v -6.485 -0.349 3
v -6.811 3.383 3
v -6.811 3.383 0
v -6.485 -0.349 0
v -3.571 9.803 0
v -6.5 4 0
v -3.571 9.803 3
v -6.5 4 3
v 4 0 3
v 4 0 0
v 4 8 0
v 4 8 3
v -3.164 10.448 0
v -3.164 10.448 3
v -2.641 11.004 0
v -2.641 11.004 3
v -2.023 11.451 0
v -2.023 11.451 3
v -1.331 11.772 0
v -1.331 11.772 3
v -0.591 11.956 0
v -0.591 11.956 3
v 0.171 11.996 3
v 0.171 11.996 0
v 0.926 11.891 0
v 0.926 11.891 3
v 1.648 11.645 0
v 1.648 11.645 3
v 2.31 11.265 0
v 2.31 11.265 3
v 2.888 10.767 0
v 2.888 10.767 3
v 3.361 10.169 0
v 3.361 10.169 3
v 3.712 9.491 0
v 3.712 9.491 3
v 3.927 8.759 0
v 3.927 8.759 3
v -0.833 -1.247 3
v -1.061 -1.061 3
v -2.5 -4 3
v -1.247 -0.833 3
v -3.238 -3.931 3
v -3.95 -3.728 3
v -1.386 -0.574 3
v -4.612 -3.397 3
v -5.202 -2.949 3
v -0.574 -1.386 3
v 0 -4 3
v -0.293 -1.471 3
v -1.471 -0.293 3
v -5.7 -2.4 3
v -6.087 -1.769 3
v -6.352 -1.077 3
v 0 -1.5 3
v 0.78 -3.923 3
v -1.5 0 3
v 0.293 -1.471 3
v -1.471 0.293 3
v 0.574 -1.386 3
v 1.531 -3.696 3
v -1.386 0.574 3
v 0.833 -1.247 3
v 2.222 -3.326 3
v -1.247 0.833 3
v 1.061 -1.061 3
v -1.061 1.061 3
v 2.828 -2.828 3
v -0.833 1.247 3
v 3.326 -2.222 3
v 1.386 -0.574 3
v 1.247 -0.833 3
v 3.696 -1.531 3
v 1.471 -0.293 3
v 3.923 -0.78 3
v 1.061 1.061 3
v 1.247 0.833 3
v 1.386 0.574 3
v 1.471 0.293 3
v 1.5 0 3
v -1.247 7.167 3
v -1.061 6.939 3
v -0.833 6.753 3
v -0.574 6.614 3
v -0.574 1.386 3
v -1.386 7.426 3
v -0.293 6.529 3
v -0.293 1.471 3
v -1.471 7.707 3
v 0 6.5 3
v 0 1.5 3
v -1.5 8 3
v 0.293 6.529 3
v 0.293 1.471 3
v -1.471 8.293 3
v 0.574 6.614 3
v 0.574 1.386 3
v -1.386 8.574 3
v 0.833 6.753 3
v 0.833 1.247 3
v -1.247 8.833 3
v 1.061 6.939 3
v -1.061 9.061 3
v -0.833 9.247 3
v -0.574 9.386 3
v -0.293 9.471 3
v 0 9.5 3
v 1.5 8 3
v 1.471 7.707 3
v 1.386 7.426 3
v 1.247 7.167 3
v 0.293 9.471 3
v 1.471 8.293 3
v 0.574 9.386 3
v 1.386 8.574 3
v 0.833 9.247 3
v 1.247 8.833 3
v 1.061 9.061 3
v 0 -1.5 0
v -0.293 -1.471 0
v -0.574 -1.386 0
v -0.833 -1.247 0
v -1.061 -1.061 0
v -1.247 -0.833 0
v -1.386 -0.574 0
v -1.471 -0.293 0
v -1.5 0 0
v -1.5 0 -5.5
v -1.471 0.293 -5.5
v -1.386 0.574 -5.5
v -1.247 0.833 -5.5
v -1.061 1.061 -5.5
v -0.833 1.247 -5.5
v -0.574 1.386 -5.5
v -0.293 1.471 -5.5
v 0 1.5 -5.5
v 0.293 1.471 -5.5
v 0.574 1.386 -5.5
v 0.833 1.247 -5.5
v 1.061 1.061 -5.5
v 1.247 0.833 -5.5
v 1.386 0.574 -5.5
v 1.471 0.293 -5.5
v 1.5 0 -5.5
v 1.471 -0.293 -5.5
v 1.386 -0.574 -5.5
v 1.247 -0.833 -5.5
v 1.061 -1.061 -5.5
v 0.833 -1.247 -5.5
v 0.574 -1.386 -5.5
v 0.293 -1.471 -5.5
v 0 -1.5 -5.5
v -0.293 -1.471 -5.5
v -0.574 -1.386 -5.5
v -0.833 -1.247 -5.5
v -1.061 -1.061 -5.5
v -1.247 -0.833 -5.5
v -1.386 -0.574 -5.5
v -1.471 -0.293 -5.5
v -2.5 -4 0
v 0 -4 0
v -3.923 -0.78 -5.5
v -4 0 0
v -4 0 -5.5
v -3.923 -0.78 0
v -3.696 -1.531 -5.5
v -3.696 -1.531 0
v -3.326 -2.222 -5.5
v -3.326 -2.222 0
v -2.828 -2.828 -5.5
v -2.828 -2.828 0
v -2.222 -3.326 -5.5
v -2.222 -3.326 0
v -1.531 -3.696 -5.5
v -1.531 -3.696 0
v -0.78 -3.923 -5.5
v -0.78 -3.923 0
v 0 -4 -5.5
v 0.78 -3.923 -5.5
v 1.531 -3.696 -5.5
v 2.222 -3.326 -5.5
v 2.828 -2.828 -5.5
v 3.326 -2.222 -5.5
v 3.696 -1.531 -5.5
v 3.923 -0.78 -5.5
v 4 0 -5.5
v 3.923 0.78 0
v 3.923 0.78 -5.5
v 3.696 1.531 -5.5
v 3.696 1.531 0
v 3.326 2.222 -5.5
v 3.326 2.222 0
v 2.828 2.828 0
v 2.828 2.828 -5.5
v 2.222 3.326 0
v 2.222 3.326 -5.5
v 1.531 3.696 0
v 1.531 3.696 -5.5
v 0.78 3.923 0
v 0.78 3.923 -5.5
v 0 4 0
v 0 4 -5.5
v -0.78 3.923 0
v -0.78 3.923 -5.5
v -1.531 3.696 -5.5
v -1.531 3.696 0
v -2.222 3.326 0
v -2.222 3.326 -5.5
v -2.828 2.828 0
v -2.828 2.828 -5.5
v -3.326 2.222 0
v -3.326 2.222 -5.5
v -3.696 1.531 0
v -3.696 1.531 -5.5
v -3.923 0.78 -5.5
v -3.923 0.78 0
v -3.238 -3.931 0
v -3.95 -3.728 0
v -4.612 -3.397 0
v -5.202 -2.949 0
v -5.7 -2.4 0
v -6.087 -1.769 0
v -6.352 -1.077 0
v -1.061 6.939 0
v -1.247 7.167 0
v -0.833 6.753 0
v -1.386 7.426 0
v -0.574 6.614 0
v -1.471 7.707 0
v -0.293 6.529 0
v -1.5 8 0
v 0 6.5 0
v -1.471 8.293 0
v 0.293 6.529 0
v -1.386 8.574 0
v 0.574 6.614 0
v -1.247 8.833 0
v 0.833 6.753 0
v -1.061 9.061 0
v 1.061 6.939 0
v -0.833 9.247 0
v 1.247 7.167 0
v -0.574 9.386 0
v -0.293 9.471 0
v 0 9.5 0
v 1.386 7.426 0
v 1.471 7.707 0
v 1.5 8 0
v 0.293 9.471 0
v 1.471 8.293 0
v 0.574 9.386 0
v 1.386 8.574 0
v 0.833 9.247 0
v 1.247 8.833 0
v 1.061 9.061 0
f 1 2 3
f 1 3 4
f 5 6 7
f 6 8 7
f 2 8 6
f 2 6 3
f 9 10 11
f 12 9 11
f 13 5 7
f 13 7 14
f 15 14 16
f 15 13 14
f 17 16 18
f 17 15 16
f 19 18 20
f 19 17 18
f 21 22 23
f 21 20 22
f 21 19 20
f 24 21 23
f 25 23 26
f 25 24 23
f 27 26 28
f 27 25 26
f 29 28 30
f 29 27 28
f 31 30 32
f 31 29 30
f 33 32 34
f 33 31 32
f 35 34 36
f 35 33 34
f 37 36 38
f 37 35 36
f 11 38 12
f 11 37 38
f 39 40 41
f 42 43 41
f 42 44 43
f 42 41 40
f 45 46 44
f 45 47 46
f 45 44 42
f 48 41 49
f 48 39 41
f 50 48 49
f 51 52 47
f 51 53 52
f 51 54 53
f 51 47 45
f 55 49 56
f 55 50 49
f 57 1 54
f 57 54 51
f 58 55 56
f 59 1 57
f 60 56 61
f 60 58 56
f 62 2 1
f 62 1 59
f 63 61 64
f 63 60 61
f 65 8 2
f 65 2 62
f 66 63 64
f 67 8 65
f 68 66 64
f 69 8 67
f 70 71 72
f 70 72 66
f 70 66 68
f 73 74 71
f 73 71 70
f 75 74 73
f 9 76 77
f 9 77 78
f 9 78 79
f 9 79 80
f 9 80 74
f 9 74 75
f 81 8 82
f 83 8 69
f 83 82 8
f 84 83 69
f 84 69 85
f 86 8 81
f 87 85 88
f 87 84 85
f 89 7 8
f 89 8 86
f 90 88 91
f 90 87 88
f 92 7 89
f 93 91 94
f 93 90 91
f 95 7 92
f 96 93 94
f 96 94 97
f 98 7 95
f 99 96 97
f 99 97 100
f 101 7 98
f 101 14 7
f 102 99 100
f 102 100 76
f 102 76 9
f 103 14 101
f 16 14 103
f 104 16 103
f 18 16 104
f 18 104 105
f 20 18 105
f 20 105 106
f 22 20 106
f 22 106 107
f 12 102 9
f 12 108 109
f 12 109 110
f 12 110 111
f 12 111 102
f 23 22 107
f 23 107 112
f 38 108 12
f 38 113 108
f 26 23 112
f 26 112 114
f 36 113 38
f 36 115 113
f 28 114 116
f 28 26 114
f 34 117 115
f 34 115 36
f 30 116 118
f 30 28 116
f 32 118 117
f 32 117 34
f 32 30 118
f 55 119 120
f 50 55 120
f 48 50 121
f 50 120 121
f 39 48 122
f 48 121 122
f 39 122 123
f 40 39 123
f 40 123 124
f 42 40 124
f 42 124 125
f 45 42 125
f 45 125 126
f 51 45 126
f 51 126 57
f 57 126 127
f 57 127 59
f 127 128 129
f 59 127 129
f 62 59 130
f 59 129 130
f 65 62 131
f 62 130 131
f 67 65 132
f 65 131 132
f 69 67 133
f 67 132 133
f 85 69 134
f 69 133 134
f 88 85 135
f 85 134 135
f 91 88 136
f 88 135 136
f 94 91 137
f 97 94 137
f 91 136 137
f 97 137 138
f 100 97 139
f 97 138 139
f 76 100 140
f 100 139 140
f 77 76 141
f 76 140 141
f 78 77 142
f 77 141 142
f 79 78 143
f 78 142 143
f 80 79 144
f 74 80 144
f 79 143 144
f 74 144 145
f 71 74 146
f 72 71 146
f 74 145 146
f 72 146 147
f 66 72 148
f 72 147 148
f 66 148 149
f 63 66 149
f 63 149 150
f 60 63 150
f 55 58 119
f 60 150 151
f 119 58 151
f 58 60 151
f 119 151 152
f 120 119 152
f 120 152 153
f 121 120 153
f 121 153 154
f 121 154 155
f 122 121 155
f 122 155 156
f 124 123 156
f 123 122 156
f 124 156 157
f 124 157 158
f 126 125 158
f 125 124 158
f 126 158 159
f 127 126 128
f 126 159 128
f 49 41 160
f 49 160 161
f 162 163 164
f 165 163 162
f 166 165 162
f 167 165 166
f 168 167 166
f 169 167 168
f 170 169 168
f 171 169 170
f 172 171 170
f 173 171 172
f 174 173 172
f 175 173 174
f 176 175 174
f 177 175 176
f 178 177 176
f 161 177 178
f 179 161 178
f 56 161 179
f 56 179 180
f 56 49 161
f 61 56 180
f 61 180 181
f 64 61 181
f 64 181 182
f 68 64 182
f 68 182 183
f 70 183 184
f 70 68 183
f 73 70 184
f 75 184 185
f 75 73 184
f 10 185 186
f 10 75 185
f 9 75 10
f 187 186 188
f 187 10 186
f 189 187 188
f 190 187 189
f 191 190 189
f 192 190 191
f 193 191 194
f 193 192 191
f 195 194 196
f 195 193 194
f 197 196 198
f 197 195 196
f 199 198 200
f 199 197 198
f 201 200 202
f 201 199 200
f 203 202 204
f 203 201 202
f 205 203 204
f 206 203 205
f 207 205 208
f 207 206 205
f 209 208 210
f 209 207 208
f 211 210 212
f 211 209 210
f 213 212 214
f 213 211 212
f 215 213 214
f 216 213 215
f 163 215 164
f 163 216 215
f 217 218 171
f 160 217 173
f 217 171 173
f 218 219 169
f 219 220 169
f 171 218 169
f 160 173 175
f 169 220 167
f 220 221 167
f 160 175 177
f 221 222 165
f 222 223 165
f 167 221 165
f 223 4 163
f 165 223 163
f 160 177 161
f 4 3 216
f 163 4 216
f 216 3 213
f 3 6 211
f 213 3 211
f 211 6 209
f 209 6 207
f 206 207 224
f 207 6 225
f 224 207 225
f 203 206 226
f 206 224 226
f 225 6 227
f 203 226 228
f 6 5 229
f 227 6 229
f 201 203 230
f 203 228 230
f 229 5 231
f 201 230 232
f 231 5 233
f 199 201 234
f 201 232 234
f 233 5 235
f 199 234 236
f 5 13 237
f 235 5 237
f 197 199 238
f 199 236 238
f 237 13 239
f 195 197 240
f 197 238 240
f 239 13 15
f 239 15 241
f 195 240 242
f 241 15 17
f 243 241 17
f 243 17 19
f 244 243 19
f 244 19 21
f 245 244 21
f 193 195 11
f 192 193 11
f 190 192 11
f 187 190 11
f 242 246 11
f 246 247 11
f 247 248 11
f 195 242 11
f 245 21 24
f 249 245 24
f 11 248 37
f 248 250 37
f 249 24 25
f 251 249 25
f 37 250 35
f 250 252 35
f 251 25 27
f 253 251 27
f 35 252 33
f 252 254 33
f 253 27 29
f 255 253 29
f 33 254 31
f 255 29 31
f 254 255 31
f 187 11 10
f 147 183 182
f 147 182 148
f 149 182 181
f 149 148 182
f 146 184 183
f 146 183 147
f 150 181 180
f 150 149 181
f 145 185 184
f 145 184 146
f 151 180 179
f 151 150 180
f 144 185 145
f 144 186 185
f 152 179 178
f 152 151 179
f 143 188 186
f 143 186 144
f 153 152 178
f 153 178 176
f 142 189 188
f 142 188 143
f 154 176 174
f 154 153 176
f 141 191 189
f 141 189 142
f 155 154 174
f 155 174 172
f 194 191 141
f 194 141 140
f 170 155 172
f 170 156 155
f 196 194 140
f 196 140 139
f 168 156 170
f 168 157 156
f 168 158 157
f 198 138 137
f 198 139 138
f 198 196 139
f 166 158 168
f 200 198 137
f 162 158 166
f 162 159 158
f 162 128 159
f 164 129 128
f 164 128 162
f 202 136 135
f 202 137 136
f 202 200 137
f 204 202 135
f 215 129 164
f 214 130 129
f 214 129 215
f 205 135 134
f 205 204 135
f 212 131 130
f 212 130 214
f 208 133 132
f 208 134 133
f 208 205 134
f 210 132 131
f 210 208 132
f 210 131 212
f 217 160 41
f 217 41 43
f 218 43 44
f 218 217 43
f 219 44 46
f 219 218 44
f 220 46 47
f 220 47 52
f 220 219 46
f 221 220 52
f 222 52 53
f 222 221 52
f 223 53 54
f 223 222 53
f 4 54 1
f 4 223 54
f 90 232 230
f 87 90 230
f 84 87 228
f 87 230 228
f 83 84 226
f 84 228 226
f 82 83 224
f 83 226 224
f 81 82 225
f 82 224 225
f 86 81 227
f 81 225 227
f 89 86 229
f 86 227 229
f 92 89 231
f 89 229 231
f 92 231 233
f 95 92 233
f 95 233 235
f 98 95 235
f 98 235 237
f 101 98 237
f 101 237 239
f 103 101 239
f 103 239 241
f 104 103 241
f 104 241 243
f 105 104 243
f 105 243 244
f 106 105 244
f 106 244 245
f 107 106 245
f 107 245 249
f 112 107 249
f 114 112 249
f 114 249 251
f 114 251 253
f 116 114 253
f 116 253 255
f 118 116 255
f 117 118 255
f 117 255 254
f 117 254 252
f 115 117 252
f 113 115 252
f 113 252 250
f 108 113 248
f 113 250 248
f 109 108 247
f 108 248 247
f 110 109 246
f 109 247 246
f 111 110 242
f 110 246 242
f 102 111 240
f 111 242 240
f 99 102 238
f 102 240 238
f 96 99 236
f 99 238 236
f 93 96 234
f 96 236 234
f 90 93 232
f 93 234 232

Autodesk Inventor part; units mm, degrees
ref_plane "YZ Plane" through (0, 0, 0) normal (1, 0, 0) x (0, 1, 0)
ref_plane "XZ Plane" through (0, 0, 0) normal (0, 1, 0) x (-1, 0, 0)
ref_plane "XY Plane" through (0, 0, 0) normal (0, 0, 1) x (1, 0, 0)
sketch "Skizze1" plane through (0, 0, 0) normal (0, 0, 1) x (1, 0, 0)
  circle A0 centre (0, 0) radius 4
  circle A1 centre (0, 8) radius 4
  line L0 (0, 0) -> (0, 8) construction
  line L1 (-4, 8) -> (-4, 0)
  line L2 (4, 0) -> (4, 8)
  dimension "d0" = 8
  dimension "d1" = 8
  dimension "d4" = 8
extrude "Extrusion1" add sketch "Skizze1" along normal blind 3
ref_plane "Arbeitsebene1" through (0, 8, 0) normal (1, 0, 0) x (0, 0, 1)
sketch "Skizze2" plane through (0, 0, 3) normal (0, 0, 1) x (1, 0, 0)
  arc A0 (-4, 0) -> (4, 0) centre (0, 0) ccw projected
  arc A1 (4, 8) -> (-4, 8) centre (0, 8) ccw projected
hole "Bohrung1" at (0, 8, 3) direction (0, 0, -1) diameter 3 end through all
hole "Bohrung2" at (0, 0, 3) direction (0, 0, -1) diameter 3 end through all
sketch "Skizze3" plane through (0, 0, 3) normal (0, 0, 1) x (1, 0, 0)
  arc A0 (-4, 0) -> (4, 0) centre (0, 0) ccw
  line L0 (4, 0) -> (4, 8)
  arc A1 (4, 8) -> (-4, 8) centre (0, 8) ccw
  line L1 (-6.5, 4) -> (-6.5, -4)
  line L2 (-6.5, -4) -> (0, -4)
  line L3 (-6.5, 4) -> (-3.570815, 9.802575)
  circle A2 centre (0, 0) radius 4 construction
  line L4 (0, 4) -> (-6.5, 4) construction
  circle A3 centre (0, 8) radius 1.5
  arc A4 (-4, 0) -> (4, 0) centre (0, 0) ccw
  circle A5 centre (0, 0) radius 1.5
  dimension "d16" = 6.5
extrude "Extrusion2" add sketch "Skizze3" against normal up to surface (3 mm away)
fillet "Rundung1" radius 4 1 edges at (-6.5, -4, 1.5)
sketch "Skizze4" plane through (0, 0, 0) normal (0, 0, -1) x (-1, 0, 0)
  arc A0 (-4, 0) -> (0, -4) centre (0, 0) ccw
  circle A1 centre (0, 0) radius 1.5
  circle A2 centre (0, 0) radius 4
  line L0 (6.5, 4) -> (0, 4)
  arc A3 (-4, 0) -> (0, -4) centre (0, 0) ccw projected
  circle A4 centre (0, 0) radius 1.5 projected
  point P0 (3.18396, 8.32)
  point P1 (3.97995, 0.4)
sketch "Skizze4 outline for Extrusion3" plane through (0, 0, 0) normal (0, 0, -1) x (-1, 0, 0)
  circle A0 centre (0, 0) radius 4
  circle A1 centre (0, 0) radius 1.5
extrude "Extrusion3" add sketch "Skizze4 outline for Extrusion3" along normal blind 5.5
sketch "Skizze5" plane through (0, 0, 3) normal (0, 0, 1) x (1, 0, 0)
  arc A0 (-6.5, 0) -> (-2.5, -4) centre (-2.5, 0) ccw
  line L0 (-3.570815, 9.802575) -> (-6.5, 4)
  line L1 (-6.5, 4) -> (-6.5, 0)
  line L2 (-6.5, 4) -> (-6.811285, 3.383359)
  line L3 (-6.811285, 3.383359) -> (-6.484779, -0.348623)
  dimension "d26" = 5
extrude "Extrusion4" add sketch "Skizze5" against normal up to surface (3 mm away)
equation "\"d0\" = Finger_diameter"
equation "\"d1\" = d0"
equation "\"d4\" = d0"
equation "\"d2\" = Join_width"
equation "\"d5\" = bearingHole"
equation "\"d19\" = bearingHole"
equation "\"FingerLaenge_B\" = 25"
equation "\"Hebel_B\" = 25"
equation "\"Finger_width\" = 22"
equation "\"Finger_diameter\" = 8"
equation "\"FingerWall\" = 3"
equation "\"Hebel_basis_2\" = 15"
equation "\"Join_width\" = 3"
equation "\"bearingHole\" = 3"
equation "\"bearingWall\" = 4"
equation "\"support_D\" = 0.25"
properties part number "FingerTip_joint _v2"
